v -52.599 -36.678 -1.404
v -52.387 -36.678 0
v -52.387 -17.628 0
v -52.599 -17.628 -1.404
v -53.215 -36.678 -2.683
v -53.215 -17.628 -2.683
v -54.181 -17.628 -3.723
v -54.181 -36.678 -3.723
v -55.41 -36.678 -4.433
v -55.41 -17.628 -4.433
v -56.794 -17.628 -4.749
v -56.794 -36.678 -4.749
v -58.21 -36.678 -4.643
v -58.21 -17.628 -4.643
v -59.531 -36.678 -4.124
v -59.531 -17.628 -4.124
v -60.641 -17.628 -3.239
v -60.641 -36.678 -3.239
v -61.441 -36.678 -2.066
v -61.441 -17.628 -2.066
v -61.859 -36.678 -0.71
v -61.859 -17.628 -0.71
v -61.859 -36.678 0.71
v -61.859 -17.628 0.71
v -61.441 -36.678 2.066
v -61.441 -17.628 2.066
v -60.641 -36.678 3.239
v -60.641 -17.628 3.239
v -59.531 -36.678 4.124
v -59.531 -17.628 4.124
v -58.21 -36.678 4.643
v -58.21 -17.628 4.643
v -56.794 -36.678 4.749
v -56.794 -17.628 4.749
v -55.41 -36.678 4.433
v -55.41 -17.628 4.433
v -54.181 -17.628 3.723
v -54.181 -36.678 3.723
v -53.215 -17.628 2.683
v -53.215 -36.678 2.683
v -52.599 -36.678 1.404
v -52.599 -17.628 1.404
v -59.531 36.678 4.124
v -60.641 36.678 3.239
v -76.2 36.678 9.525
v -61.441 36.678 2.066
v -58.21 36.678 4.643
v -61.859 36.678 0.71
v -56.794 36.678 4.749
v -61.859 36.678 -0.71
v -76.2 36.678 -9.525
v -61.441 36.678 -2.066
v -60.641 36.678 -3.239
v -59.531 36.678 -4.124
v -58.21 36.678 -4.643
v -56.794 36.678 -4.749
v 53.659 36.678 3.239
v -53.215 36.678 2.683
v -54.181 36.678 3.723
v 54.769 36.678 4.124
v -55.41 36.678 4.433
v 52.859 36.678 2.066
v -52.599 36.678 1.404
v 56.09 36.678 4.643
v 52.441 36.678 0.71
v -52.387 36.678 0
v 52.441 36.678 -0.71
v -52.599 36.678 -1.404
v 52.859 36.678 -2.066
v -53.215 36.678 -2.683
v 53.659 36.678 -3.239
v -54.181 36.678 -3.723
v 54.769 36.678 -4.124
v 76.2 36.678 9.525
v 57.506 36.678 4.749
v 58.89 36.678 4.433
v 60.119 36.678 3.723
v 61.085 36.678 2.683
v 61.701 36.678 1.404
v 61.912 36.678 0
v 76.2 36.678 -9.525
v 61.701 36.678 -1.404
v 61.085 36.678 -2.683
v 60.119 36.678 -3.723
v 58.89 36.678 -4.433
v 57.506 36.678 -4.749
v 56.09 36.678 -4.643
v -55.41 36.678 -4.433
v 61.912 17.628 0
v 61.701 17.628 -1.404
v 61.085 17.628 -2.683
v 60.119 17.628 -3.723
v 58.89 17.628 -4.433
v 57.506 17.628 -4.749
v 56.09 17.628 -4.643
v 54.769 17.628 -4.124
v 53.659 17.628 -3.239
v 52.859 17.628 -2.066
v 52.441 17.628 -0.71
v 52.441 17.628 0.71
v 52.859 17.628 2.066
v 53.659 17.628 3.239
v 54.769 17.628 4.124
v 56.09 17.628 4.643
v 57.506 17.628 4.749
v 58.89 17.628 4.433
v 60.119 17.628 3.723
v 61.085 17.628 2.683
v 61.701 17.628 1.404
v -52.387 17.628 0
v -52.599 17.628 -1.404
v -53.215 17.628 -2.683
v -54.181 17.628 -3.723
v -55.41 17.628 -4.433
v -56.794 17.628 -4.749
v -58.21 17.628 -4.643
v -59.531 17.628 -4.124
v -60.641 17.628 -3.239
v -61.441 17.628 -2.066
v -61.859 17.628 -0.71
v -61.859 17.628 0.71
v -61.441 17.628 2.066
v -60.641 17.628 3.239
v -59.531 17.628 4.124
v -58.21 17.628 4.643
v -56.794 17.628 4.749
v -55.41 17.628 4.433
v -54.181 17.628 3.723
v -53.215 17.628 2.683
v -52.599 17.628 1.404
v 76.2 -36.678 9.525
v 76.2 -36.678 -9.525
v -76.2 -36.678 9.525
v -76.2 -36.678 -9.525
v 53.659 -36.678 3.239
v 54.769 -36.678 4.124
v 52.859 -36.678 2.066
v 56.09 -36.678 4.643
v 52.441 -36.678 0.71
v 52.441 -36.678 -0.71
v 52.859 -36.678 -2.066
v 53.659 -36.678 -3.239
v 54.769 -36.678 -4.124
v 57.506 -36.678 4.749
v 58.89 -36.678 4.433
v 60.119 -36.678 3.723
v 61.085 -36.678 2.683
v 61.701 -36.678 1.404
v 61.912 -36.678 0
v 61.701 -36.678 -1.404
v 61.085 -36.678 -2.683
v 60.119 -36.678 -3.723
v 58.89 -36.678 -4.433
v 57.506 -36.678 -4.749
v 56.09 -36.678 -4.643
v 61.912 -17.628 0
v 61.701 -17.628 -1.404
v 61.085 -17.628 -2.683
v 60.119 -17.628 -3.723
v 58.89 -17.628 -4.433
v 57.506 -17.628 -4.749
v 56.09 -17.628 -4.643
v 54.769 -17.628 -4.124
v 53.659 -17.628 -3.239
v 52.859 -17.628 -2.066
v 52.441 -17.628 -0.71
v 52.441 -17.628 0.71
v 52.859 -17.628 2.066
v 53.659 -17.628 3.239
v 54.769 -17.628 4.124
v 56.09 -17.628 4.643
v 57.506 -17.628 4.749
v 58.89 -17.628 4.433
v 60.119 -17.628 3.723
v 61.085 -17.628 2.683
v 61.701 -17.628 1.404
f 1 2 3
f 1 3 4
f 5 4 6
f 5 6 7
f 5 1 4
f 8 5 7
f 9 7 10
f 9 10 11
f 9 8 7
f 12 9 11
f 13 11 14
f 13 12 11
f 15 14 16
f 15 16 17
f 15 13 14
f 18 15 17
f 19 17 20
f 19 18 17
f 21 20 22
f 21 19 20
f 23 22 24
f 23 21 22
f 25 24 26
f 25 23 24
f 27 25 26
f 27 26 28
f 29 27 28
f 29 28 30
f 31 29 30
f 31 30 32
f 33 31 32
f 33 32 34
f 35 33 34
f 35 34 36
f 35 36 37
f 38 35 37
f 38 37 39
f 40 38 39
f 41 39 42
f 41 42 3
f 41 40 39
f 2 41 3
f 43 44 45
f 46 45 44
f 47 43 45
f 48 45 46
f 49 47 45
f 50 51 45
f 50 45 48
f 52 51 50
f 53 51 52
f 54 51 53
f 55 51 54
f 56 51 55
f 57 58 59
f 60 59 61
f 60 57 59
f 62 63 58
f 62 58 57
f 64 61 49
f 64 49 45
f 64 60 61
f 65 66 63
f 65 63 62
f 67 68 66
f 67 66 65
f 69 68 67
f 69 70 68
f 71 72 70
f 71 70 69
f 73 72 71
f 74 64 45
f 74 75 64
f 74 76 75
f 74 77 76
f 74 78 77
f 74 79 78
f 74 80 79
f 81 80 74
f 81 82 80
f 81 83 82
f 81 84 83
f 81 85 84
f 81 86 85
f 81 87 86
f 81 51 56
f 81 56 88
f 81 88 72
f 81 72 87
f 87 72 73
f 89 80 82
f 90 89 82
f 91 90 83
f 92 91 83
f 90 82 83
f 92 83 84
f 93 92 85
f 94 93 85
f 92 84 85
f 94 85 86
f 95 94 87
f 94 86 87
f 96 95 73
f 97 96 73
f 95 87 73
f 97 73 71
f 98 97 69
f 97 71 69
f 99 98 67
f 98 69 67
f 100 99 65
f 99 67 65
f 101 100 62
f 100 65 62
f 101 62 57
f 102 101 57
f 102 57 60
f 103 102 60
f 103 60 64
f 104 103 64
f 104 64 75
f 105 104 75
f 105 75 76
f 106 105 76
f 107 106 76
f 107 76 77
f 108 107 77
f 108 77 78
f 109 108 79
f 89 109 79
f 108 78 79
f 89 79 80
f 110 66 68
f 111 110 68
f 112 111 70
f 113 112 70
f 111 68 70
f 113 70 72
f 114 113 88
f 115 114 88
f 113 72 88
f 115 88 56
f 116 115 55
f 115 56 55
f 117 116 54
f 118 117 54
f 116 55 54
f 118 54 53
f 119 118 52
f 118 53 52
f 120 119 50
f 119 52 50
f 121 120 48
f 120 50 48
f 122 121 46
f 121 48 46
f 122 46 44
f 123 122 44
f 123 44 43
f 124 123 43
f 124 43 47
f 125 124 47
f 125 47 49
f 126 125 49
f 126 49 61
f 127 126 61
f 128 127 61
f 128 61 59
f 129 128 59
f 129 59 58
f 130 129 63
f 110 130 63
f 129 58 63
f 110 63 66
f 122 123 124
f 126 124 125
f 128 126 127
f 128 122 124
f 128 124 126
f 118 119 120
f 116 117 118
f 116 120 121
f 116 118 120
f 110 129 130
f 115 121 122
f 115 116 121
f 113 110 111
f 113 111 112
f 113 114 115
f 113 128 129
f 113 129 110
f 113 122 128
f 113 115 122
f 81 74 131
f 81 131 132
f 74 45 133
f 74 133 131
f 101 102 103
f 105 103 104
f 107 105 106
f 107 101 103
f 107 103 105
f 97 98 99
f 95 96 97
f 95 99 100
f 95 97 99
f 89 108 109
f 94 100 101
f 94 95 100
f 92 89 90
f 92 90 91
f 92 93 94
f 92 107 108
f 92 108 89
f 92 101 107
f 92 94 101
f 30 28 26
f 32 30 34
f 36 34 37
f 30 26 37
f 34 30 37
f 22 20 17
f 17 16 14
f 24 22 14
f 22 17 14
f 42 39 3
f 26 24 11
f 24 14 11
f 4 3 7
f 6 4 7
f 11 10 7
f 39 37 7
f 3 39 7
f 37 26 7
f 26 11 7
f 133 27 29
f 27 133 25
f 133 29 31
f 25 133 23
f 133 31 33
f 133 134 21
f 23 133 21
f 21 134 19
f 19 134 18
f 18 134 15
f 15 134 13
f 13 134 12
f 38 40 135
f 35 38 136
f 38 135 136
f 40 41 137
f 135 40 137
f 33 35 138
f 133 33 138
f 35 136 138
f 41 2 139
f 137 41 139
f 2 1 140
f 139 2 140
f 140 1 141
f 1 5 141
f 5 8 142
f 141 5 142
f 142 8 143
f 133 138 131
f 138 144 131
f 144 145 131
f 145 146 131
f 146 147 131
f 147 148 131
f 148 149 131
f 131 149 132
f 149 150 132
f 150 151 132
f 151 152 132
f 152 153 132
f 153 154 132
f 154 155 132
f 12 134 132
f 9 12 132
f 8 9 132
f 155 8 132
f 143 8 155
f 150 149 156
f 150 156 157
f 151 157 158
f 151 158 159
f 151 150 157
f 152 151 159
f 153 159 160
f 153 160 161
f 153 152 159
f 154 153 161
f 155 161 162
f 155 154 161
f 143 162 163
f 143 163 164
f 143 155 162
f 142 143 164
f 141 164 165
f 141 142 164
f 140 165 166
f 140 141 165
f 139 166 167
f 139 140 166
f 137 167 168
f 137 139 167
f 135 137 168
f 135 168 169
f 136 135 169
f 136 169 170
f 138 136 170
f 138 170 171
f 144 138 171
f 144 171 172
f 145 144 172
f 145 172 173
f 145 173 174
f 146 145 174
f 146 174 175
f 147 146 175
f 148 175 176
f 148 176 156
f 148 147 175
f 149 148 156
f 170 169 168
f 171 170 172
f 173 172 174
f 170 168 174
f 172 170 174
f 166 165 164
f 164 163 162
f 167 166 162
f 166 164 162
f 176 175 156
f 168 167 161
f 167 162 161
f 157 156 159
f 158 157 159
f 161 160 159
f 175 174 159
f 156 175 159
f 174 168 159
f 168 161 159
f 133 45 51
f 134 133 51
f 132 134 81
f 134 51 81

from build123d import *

# Parameters (mm, degrees)
SKETCH1_W           = 152.4
SKETCH1_H           = 19.05
BOSS_EXTRUDE1_DEPTH = 36.6776
SKETCH2_R           = 4.7625
CUT_EXTRUDE1_DEPTH  = 19.05


with BuildPart() as part:
    # Sketch1 → Boss-Extrude1 (new body, symmetric)
    with BuildSketch(Plane(origin=(0, 0, 0), x_dir=(1, 0, 0), z_dir=(0, 1, 0))):
        Rectangle(SKETCH1_W, SKETCH1_H)
    extrude(amount=BOSS_EXTRUDE1_DEPTH, both=True)

    # Sketch2 → Cut-Extrude1 (cut)
    with BuildSketch(Plane(origin=(0, 36.6776, 0), x_dir=(1, 0, 0), z_dir=(0, 1, 0))):
        with Locations((-57.15, 0)):
            Circle(SKETCH2_R)
        with Locations((57.15, 0)):
            Circle(SKETCH2_R)
    cut_extrude1 = extrude(amount=-CUT_EXTRUDE1_DEPTH, mode=Mode.SUBTRACT)

    # Mirror2: Cut-Extrude1 across plane
    add(cut_extrude1.mirror(Plane.ZX), mode=Mode.SUBTRACT)


solid = part.part
